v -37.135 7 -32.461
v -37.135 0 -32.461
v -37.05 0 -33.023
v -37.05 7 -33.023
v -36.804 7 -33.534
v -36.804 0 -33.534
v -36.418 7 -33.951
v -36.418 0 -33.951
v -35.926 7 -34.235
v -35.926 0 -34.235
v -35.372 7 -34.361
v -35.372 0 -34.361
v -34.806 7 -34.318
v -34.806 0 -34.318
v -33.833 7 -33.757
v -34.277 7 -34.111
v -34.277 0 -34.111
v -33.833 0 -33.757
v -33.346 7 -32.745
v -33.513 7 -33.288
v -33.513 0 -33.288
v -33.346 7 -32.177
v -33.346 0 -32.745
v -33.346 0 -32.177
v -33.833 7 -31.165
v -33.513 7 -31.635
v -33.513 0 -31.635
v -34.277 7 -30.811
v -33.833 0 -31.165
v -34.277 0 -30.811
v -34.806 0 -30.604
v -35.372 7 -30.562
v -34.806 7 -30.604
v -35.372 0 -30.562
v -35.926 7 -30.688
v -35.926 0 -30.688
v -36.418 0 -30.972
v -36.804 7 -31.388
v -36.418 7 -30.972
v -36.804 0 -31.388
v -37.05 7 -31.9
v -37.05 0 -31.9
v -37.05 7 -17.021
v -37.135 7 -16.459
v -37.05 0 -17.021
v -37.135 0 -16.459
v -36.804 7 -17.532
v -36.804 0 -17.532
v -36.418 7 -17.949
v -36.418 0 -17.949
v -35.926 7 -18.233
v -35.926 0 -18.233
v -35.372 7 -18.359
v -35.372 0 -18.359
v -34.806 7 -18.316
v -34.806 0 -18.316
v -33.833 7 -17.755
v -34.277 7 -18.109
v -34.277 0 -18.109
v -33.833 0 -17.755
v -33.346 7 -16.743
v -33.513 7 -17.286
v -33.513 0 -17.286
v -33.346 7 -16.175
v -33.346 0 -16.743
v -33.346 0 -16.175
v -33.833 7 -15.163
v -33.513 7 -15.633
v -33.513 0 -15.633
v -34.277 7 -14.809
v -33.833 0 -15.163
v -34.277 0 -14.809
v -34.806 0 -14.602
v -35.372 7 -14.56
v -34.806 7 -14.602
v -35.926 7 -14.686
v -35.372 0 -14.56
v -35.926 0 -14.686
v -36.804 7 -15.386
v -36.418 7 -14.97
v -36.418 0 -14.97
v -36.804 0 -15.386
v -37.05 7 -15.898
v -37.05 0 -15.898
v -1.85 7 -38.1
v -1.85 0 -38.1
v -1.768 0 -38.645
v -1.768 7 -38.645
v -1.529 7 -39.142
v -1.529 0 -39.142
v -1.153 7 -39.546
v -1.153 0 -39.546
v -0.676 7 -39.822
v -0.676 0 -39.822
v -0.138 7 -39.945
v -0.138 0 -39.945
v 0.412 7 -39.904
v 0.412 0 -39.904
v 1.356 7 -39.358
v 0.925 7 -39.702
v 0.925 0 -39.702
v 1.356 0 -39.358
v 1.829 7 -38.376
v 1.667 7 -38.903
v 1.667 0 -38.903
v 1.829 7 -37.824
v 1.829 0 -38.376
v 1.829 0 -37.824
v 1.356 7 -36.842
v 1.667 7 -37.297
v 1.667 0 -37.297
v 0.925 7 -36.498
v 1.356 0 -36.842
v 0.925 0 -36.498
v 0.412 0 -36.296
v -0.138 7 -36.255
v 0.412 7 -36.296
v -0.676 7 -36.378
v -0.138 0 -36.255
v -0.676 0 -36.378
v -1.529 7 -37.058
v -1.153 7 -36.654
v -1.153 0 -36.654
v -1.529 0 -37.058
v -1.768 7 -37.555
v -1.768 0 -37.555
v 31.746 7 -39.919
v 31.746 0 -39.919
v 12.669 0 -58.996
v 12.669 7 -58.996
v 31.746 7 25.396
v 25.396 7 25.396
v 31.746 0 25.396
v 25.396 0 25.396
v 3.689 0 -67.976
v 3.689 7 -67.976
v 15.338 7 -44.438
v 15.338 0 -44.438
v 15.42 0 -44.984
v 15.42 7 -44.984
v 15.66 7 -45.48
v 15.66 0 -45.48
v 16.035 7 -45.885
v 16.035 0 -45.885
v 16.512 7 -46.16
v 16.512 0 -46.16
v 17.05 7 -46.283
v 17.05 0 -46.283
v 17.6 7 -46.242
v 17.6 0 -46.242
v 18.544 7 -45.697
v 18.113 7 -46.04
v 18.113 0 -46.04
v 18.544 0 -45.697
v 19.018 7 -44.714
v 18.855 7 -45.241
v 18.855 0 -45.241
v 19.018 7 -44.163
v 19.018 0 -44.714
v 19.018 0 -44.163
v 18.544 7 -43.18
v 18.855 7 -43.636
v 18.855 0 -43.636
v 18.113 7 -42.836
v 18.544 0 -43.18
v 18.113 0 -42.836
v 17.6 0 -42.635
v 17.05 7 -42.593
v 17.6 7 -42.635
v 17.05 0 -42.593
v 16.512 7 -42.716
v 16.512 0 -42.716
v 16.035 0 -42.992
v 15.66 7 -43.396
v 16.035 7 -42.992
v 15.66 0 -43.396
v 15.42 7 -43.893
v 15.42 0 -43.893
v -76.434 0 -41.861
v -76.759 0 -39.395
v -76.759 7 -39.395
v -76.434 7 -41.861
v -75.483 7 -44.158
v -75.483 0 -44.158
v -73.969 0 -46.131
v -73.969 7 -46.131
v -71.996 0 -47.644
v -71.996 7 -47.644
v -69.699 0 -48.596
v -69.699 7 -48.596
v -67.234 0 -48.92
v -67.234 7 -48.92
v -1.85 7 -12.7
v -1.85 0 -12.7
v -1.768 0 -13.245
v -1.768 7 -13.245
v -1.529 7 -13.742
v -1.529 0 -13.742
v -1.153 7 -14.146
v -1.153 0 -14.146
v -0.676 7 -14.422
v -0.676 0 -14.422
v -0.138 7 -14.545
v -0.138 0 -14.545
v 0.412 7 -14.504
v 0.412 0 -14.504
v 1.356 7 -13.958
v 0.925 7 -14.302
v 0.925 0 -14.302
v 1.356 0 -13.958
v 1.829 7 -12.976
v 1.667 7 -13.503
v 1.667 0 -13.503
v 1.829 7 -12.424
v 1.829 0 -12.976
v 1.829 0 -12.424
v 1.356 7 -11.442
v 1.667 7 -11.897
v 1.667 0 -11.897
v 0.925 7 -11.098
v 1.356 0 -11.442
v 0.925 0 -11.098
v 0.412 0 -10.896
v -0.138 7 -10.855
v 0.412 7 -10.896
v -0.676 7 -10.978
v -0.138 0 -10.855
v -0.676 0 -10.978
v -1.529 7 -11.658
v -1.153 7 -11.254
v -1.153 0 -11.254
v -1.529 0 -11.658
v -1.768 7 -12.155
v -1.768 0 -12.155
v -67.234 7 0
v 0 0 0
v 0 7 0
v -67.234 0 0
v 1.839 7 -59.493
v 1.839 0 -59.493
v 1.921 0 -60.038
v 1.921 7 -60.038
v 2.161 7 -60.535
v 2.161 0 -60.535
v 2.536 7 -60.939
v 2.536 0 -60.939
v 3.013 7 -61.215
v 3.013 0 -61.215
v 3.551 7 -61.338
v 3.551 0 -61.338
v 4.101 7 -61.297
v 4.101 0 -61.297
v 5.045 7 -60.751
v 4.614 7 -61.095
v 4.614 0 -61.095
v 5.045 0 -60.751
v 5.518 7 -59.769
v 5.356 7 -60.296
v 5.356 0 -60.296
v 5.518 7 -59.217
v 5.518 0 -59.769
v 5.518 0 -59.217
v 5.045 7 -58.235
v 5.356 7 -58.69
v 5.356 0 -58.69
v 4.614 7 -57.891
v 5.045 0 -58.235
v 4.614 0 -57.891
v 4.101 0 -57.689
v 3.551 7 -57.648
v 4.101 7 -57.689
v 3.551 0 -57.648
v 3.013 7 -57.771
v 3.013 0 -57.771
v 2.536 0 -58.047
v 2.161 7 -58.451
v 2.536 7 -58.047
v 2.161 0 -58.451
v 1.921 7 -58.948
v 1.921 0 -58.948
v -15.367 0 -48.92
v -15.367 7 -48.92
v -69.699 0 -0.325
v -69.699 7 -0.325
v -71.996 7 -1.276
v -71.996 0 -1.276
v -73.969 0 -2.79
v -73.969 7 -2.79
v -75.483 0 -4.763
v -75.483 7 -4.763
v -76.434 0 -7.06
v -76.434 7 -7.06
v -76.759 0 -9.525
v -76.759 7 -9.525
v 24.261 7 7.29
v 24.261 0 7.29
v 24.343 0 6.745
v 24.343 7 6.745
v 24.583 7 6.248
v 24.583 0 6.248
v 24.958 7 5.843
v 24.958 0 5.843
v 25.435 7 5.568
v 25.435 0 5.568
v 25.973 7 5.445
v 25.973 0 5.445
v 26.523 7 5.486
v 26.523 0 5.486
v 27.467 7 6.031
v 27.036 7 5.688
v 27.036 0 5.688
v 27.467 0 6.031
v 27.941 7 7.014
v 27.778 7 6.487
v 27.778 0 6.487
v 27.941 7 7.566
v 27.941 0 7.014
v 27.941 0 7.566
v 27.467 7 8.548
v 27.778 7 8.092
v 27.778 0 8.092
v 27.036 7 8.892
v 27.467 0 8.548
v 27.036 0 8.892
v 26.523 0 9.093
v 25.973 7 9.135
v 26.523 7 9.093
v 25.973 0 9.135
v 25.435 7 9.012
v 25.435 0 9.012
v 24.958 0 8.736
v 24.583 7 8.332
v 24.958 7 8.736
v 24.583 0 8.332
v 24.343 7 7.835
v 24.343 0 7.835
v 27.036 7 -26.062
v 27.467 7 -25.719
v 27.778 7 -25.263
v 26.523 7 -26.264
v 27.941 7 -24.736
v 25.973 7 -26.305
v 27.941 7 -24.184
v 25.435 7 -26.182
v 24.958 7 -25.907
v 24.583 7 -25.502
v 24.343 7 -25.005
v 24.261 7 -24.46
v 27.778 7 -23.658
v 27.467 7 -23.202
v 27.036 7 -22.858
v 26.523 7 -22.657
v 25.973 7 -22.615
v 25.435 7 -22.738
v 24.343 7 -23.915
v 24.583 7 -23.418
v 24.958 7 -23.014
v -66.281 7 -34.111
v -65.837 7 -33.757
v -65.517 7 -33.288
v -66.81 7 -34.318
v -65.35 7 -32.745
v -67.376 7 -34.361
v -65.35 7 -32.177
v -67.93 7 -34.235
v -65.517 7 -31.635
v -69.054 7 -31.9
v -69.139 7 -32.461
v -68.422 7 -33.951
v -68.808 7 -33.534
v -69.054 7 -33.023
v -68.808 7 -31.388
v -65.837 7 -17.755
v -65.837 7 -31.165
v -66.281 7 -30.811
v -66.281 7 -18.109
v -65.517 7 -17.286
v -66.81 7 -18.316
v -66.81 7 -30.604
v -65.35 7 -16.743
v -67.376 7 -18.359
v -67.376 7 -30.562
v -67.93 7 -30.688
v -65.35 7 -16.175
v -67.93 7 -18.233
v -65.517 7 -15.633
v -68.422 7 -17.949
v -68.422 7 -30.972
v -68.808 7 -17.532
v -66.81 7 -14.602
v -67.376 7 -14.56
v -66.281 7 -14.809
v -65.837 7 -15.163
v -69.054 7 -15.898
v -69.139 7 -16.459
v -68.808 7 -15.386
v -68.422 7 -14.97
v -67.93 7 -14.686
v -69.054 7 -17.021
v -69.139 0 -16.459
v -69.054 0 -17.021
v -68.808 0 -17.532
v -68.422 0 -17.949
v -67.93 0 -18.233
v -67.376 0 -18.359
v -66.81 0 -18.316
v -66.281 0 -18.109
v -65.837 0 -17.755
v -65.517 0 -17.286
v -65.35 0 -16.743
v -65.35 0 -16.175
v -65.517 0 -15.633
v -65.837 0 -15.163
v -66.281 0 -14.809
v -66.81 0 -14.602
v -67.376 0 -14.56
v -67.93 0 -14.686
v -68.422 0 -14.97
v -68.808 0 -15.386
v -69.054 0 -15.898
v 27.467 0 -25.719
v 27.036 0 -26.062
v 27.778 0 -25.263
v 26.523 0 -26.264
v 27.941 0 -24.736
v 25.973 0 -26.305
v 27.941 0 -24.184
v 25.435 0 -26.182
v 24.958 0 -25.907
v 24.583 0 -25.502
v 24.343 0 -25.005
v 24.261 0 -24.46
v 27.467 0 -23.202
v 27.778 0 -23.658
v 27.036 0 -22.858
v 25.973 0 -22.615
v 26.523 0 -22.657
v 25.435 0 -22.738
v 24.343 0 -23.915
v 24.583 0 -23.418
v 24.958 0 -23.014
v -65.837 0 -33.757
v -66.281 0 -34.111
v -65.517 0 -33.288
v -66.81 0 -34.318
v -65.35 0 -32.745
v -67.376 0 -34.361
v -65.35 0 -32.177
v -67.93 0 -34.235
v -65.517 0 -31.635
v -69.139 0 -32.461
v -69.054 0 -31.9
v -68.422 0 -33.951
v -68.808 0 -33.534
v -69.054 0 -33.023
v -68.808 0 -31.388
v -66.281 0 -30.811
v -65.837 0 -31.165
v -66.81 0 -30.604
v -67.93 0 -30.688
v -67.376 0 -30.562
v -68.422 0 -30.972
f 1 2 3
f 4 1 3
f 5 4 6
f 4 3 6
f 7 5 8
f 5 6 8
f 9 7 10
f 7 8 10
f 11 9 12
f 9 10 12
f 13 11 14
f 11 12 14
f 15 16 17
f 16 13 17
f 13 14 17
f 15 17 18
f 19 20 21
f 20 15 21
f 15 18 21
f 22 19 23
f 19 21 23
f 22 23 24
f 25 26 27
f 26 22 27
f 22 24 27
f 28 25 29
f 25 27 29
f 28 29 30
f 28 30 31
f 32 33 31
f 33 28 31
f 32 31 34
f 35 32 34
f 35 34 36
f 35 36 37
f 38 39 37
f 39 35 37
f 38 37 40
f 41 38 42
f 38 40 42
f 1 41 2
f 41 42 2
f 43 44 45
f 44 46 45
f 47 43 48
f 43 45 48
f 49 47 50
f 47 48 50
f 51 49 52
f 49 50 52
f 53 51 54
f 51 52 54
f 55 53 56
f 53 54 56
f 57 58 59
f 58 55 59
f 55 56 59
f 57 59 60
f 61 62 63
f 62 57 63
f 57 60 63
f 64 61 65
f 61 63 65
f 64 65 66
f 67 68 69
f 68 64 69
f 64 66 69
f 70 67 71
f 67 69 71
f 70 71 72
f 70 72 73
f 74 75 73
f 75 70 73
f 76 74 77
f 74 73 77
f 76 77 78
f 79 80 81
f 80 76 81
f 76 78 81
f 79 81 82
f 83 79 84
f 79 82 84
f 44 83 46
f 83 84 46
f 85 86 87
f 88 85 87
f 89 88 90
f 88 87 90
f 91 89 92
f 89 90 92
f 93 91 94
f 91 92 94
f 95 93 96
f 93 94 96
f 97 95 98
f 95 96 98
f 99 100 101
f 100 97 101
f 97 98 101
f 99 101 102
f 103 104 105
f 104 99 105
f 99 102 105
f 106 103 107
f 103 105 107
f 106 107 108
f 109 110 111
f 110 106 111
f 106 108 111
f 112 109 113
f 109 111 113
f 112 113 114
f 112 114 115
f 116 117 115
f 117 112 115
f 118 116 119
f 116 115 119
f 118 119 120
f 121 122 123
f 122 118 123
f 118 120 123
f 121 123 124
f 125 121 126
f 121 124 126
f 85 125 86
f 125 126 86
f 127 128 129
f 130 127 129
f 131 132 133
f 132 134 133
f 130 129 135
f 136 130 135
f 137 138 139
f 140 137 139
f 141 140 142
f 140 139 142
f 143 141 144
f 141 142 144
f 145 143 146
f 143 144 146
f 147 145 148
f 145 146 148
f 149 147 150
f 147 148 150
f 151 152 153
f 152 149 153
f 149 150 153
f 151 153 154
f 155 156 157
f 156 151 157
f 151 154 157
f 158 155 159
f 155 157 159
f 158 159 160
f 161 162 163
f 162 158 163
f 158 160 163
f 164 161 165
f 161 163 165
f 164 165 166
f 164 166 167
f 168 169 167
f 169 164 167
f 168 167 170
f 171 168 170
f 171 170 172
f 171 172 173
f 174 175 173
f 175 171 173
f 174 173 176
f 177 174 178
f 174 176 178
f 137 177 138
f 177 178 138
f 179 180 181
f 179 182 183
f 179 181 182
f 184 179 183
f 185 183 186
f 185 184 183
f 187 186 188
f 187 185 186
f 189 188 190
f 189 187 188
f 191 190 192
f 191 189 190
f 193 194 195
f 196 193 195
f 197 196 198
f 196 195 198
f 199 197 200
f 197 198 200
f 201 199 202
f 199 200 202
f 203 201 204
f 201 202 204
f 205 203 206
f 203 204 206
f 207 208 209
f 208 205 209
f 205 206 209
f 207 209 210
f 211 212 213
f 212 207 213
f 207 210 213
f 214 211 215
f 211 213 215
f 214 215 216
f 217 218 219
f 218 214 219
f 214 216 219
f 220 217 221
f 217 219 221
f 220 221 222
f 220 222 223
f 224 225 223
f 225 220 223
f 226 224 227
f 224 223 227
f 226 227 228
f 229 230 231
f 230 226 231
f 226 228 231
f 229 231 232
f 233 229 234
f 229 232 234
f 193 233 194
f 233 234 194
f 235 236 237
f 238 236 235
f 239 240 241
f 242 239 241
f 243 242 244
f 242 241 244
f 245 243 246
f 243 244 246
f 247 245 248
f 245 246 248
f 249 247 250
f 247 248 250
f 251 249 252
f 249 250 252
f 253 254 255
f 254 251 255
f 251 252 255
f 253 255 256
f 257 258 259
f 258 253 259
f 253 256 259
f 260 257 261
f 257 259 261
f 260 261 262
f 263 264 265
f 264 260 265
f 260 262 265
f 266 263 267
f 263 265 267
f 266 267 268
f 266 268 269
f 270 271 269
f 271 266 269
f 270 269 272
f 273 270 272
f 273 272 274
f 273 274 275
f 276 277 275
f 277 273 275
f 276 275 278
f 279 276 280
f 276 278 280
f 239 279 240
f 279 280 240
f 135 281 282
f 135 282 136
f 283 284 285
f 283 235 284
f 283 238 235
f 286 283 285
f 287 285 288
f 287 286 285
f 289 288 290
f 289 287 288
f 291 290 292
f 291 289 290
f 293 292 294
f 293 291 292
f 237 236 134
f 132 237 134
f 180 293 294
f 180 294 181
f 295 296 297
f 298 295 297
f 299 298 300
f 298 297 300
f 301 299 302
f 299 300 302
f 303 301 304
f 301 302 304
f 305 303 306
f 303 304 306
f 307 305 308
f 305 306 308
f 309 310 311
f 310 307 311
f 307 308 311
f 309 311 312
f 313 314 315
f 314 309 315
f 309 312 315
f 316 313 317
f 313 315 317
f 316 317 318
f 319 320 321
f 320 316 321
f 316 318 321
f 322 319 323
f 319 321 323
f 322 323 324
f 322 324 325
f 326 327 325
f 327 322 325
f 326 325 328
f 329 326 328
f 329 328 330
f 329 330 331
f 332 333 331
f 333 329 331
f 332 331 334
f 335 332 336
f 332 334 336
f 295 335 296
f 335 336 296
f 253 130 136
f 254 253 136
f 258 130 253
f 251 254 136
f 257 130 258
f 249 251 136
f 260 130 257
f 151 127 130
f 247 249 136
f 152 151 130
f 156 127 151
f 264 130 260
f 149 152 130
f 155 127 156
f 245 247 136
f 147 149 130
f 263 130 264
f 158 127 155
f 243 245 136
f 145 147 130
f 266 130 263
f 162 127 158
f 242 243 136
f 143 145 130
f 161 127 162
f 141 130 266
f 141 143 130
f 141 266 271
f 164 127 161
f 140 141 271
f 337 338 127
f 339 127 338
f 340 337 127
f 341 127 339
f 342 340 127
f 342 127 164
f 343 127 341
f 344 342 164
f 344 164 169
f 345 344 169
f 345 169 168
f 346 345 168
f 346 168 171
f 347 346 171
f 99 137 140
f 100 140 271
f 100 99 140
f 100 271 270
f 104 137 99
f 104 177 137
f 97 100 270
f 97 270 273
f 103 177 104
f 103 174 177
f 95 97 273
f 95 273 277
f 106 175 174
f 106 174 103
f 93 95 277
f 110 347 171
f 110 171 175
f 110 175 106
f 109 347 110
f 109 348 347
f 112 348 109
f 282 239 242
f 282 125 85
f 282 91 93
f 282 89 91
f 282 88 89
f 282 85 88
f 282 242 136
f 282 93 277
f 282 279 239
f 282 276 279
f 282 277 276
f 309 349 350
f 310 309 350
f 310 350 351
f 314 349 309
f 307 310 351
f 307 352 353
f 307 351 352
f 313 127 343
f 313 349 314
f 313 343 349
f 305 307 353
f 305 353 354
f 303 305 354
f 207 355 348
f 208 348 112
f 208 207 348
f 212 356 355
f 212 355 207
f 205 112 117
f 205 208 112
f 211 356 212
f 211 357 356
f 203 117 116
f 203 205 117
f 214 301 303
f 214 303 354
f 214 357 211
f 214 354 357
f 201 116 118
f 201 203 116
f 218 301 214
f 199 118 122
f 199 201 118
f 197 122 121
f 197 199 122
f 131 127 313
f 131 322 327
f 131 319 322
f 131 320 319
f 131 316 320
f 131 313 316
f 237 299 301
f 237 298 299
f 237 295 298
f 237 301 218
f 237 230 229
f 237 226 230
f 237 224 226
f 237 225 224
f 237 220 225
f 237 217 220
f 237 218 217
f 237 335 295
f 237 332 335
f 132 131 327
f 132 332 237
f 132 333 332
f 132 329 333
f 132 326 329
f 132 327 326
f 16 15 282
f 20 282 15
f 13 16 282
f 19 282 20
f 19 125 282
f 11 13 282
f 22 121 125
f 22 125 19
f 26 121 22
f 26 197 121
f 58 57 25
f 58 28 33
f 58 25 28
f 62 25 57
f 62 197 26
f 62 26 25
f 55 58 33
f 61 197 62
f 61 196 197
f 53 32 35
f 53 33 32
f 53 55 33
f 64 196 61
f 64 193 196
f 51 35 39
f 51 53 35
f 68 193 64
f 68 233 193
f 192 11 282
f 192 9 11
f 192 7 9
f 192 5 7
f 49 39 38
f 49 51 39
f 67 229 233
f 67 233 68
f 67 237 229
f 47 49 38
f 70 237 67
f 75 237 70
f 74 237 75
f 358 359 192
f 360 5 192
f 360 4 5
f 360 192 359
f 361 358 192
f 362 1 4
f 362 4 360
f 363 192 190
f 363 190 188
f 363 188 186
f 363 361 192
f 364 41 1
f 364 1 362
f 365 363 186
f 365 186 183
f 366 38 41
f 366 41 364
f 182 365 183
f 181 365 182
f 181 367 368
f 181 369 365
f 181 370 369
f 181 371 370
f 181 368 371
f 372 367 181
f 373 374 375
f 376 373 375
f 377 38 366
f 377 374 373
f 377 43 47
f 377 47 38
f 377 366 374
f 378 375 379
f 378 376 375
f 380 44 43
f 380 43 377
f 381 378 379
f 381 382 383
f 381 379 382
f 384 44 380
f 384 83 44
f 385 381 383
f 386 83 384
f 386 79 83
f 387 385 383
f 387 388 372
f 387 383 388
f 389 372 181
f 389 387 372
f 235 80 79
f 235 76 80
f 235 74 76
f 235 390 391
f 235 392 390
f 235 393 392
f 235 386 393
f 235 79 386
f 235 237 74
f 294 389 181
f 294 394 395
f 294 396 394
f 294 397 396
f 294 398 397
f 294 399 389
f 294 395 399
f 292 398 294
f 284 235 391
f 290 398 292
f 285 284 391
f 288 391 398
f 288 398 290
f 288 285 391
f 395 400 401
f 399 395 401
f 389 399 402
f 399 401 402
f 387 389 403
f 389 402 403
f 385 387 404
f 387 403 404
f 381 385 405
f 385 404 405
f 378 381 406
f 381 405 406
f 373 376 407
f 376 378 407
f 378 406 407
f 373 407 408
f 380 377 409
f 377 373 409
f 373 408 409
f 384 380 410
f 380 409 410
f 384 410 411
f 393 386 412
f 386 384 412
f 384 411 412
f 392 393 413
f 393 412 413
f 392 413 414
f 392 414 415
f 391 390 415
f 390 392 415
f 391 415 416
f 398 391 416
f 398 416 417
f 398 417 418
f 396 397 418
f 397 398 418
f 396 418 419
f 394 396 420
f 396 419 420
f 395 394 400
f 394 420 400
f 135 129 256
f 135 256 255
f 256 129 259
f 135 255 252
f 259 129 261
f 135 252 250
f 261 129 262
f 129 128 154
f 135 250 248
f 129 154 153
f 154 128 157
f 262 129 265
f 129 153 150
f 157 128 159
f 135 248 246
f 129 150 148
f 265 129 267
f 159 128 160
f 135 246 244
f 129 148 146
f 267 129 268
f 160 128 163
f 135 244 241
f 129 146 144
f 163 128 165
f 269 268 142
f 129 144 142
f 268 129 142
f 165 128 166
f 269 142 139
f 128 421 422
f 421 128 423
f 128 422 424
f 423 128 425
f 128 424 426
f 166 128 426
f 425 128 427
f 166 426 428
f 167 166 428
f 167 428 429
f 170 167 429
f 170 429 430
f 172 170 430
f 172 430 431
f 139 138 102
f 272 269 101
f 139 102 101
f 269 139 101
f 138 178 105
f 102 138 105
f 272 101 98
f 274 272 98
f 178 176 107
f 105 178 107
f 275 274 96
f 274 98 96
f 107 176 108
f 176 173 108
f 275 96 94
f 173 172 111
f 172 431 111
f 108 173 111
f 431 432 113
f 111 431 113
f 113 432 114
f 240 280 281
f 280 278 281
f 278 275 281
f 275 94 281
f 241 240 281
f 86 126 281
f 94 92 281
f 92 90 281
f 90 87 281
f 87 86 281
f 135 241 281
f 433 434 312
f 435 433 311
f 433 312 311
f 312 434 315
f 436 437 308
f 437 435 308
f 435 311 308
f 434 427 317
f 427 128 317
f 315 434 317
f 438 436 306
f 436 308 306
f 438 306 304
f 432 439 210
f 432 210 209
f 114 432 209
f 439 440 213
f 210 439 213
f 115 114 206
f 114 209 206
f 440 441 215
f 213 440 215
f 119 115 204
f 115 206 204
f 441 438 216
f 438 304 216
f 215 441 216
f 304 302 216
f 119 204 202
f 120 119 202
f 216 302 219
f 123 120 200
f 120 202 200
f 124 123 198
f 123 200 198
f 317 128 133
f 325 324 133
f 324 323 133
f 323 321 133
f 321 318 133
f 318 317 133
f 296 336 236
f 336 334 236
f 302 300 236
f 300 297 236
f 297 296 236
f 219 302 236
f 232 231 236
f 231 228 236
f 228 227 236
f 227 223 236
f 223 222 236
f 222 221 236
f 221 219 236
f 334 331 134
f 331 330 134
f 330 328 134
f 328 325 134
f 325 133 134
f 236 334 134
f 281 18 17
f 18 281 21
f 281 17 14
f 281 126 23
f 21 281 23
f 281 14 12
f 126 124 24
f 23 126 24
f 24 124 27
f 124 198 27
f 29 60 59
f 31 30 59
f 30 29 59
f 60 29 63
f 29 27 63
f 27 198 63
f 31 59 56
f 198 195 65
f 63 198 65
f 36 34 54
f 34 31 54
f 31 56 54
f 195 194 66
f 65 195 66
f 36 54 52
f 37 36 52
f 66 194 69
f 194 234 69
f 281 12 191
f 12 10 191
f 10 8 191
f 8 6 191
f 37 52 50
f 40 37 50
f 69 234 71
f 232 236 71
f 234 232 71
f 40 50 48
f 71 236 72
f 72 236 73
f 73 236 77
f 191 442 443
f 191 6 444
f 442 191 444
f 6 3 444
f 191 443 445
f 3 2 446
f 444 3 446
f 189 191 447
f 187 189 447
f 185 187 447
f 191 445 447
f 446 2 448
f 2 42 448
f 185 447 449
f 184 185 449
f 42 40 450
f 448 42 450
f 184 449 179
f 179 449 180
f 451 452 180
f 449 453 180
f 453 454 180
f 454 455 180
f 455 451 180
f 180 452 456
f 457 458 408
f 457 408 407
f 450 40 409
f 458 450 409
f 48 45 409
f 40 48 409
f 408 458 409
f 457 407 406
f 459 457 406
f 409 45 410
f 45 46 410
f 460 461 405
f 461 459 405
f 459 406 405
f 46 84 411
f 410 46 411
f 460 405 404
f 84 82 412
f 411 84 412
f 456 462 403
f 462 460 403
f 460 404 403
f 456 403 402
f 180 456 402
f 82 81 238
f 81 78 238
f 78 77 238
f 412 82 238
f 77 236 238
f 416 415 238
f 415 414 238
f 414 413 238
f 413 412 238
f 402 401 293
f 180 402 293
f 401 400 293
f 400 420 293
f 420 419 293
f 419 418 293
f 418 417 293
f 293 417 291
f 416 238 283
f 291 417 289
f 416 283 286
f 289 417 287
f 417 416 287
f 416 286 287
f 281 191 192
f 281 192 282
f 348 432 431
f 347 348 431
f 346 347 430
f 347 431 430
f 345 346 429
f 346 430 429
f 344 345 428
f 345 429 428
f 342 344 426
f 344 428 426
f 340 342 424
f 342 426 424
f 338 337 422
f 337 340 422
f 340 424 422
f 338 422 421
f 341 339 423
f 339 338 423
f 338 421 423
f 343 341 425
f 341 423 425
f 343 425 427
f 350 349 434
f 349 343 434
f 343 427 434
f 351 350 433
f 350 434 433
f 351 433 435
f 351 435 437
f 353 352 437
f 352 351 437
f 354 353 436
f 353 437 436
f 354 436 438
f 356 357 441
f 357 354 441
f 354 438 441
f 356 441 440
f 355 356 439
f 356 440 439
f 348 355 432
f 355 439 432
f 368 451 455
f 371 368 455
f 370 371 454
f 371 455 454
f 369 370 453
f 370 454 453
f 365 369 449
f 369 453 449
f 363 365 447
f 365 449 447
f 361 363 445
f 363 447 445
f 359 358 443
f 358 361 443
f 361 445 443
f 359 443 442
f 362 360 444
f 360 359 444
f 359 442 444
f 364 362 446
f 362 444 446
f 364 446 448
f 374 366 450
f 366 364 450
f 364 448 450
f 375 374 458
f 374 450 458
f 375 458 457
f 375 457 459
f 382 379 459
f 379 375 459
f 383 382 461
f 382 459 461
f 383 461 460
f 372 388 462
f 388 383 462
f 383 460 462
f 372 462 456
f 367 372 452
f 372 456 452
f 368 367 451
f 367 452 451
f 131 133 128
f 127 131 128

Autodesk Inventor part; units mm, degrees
ref_plane "YZ Plane" through (0, 0, 0) normal (1, 0, 0) x (0, 1, 0)
ref_plane "XZ Plane" through (0, 0, 0) normal (0, 1, 0) x (-1, 0, 0)
ref_plane "XY Plane" through (0, 0, 0) normal (0, 0, 1) x (1, 0, 0)
sketch "Sketch1" plane through (0, 0, 0) normal (0, 1, 0) x (-1, 0, 0)
  line L0 (0, 0) -> (67.2338, 0)
  arc A0 (76.7588, -9.525) -> (67.2338, 0) centre (67.2338, -9.525) ccw
  arc A1 (67.2338, -48.9204) -> (76.7588, -39.3954) centre (67.2338, -39.3954) ccw
  line L1 (76.7588, -9.525) -> (76.7588, -39.3954)
  line L2 (67.2338, -48.9204) -> (15.367, -48.9204)
  line L3 (15.367, -48.9204) -> (-3.6891, -67.9765)
  line L4 (0, 0) -> (-25.3962, 25.3962)
  circle A2 centre (35.2298, -16.4592) radius 1.905
  circle A3 centre (35.2298, -32.4612) radius 1.905
  circle A4 centre (67.2338, -32.4612) radius 1.905
  circle A5 centre (67.2338, -16.4592) radius 1.905
  circle A6 centre (-26.1112, -24.4602) radius 1.85
  circle A7 centre (-26.1112, 7.2898) radius 1.85
  line L5 (-25.3962, 25.3962) -> (-31.7462, 25.3962)
  line L6 (-31.7462, 25.3962) -> (-31.7462, -39.9194)
  line L7 (-31.7462, -39.9194) -> (-3.6891, -67.9765)
  circle A8 centre (0, -12.7) radius 1.85
  circle A9 centre (0, -38.1) radius 1.85
  line L8 (-3.6891, -67.9765) -> (-12.6694, -58.9962)
  circle A10 centre (-3.6891, -59.4929) radius 1.85
  circle A11 centre (-17.1882, -44.4383) radius 1.85
  dimension "d21" = 6.35
extrude "Extrusion1" add sketch "Sketch1" along normal blind 7
properties part number "MotorSuspension"
